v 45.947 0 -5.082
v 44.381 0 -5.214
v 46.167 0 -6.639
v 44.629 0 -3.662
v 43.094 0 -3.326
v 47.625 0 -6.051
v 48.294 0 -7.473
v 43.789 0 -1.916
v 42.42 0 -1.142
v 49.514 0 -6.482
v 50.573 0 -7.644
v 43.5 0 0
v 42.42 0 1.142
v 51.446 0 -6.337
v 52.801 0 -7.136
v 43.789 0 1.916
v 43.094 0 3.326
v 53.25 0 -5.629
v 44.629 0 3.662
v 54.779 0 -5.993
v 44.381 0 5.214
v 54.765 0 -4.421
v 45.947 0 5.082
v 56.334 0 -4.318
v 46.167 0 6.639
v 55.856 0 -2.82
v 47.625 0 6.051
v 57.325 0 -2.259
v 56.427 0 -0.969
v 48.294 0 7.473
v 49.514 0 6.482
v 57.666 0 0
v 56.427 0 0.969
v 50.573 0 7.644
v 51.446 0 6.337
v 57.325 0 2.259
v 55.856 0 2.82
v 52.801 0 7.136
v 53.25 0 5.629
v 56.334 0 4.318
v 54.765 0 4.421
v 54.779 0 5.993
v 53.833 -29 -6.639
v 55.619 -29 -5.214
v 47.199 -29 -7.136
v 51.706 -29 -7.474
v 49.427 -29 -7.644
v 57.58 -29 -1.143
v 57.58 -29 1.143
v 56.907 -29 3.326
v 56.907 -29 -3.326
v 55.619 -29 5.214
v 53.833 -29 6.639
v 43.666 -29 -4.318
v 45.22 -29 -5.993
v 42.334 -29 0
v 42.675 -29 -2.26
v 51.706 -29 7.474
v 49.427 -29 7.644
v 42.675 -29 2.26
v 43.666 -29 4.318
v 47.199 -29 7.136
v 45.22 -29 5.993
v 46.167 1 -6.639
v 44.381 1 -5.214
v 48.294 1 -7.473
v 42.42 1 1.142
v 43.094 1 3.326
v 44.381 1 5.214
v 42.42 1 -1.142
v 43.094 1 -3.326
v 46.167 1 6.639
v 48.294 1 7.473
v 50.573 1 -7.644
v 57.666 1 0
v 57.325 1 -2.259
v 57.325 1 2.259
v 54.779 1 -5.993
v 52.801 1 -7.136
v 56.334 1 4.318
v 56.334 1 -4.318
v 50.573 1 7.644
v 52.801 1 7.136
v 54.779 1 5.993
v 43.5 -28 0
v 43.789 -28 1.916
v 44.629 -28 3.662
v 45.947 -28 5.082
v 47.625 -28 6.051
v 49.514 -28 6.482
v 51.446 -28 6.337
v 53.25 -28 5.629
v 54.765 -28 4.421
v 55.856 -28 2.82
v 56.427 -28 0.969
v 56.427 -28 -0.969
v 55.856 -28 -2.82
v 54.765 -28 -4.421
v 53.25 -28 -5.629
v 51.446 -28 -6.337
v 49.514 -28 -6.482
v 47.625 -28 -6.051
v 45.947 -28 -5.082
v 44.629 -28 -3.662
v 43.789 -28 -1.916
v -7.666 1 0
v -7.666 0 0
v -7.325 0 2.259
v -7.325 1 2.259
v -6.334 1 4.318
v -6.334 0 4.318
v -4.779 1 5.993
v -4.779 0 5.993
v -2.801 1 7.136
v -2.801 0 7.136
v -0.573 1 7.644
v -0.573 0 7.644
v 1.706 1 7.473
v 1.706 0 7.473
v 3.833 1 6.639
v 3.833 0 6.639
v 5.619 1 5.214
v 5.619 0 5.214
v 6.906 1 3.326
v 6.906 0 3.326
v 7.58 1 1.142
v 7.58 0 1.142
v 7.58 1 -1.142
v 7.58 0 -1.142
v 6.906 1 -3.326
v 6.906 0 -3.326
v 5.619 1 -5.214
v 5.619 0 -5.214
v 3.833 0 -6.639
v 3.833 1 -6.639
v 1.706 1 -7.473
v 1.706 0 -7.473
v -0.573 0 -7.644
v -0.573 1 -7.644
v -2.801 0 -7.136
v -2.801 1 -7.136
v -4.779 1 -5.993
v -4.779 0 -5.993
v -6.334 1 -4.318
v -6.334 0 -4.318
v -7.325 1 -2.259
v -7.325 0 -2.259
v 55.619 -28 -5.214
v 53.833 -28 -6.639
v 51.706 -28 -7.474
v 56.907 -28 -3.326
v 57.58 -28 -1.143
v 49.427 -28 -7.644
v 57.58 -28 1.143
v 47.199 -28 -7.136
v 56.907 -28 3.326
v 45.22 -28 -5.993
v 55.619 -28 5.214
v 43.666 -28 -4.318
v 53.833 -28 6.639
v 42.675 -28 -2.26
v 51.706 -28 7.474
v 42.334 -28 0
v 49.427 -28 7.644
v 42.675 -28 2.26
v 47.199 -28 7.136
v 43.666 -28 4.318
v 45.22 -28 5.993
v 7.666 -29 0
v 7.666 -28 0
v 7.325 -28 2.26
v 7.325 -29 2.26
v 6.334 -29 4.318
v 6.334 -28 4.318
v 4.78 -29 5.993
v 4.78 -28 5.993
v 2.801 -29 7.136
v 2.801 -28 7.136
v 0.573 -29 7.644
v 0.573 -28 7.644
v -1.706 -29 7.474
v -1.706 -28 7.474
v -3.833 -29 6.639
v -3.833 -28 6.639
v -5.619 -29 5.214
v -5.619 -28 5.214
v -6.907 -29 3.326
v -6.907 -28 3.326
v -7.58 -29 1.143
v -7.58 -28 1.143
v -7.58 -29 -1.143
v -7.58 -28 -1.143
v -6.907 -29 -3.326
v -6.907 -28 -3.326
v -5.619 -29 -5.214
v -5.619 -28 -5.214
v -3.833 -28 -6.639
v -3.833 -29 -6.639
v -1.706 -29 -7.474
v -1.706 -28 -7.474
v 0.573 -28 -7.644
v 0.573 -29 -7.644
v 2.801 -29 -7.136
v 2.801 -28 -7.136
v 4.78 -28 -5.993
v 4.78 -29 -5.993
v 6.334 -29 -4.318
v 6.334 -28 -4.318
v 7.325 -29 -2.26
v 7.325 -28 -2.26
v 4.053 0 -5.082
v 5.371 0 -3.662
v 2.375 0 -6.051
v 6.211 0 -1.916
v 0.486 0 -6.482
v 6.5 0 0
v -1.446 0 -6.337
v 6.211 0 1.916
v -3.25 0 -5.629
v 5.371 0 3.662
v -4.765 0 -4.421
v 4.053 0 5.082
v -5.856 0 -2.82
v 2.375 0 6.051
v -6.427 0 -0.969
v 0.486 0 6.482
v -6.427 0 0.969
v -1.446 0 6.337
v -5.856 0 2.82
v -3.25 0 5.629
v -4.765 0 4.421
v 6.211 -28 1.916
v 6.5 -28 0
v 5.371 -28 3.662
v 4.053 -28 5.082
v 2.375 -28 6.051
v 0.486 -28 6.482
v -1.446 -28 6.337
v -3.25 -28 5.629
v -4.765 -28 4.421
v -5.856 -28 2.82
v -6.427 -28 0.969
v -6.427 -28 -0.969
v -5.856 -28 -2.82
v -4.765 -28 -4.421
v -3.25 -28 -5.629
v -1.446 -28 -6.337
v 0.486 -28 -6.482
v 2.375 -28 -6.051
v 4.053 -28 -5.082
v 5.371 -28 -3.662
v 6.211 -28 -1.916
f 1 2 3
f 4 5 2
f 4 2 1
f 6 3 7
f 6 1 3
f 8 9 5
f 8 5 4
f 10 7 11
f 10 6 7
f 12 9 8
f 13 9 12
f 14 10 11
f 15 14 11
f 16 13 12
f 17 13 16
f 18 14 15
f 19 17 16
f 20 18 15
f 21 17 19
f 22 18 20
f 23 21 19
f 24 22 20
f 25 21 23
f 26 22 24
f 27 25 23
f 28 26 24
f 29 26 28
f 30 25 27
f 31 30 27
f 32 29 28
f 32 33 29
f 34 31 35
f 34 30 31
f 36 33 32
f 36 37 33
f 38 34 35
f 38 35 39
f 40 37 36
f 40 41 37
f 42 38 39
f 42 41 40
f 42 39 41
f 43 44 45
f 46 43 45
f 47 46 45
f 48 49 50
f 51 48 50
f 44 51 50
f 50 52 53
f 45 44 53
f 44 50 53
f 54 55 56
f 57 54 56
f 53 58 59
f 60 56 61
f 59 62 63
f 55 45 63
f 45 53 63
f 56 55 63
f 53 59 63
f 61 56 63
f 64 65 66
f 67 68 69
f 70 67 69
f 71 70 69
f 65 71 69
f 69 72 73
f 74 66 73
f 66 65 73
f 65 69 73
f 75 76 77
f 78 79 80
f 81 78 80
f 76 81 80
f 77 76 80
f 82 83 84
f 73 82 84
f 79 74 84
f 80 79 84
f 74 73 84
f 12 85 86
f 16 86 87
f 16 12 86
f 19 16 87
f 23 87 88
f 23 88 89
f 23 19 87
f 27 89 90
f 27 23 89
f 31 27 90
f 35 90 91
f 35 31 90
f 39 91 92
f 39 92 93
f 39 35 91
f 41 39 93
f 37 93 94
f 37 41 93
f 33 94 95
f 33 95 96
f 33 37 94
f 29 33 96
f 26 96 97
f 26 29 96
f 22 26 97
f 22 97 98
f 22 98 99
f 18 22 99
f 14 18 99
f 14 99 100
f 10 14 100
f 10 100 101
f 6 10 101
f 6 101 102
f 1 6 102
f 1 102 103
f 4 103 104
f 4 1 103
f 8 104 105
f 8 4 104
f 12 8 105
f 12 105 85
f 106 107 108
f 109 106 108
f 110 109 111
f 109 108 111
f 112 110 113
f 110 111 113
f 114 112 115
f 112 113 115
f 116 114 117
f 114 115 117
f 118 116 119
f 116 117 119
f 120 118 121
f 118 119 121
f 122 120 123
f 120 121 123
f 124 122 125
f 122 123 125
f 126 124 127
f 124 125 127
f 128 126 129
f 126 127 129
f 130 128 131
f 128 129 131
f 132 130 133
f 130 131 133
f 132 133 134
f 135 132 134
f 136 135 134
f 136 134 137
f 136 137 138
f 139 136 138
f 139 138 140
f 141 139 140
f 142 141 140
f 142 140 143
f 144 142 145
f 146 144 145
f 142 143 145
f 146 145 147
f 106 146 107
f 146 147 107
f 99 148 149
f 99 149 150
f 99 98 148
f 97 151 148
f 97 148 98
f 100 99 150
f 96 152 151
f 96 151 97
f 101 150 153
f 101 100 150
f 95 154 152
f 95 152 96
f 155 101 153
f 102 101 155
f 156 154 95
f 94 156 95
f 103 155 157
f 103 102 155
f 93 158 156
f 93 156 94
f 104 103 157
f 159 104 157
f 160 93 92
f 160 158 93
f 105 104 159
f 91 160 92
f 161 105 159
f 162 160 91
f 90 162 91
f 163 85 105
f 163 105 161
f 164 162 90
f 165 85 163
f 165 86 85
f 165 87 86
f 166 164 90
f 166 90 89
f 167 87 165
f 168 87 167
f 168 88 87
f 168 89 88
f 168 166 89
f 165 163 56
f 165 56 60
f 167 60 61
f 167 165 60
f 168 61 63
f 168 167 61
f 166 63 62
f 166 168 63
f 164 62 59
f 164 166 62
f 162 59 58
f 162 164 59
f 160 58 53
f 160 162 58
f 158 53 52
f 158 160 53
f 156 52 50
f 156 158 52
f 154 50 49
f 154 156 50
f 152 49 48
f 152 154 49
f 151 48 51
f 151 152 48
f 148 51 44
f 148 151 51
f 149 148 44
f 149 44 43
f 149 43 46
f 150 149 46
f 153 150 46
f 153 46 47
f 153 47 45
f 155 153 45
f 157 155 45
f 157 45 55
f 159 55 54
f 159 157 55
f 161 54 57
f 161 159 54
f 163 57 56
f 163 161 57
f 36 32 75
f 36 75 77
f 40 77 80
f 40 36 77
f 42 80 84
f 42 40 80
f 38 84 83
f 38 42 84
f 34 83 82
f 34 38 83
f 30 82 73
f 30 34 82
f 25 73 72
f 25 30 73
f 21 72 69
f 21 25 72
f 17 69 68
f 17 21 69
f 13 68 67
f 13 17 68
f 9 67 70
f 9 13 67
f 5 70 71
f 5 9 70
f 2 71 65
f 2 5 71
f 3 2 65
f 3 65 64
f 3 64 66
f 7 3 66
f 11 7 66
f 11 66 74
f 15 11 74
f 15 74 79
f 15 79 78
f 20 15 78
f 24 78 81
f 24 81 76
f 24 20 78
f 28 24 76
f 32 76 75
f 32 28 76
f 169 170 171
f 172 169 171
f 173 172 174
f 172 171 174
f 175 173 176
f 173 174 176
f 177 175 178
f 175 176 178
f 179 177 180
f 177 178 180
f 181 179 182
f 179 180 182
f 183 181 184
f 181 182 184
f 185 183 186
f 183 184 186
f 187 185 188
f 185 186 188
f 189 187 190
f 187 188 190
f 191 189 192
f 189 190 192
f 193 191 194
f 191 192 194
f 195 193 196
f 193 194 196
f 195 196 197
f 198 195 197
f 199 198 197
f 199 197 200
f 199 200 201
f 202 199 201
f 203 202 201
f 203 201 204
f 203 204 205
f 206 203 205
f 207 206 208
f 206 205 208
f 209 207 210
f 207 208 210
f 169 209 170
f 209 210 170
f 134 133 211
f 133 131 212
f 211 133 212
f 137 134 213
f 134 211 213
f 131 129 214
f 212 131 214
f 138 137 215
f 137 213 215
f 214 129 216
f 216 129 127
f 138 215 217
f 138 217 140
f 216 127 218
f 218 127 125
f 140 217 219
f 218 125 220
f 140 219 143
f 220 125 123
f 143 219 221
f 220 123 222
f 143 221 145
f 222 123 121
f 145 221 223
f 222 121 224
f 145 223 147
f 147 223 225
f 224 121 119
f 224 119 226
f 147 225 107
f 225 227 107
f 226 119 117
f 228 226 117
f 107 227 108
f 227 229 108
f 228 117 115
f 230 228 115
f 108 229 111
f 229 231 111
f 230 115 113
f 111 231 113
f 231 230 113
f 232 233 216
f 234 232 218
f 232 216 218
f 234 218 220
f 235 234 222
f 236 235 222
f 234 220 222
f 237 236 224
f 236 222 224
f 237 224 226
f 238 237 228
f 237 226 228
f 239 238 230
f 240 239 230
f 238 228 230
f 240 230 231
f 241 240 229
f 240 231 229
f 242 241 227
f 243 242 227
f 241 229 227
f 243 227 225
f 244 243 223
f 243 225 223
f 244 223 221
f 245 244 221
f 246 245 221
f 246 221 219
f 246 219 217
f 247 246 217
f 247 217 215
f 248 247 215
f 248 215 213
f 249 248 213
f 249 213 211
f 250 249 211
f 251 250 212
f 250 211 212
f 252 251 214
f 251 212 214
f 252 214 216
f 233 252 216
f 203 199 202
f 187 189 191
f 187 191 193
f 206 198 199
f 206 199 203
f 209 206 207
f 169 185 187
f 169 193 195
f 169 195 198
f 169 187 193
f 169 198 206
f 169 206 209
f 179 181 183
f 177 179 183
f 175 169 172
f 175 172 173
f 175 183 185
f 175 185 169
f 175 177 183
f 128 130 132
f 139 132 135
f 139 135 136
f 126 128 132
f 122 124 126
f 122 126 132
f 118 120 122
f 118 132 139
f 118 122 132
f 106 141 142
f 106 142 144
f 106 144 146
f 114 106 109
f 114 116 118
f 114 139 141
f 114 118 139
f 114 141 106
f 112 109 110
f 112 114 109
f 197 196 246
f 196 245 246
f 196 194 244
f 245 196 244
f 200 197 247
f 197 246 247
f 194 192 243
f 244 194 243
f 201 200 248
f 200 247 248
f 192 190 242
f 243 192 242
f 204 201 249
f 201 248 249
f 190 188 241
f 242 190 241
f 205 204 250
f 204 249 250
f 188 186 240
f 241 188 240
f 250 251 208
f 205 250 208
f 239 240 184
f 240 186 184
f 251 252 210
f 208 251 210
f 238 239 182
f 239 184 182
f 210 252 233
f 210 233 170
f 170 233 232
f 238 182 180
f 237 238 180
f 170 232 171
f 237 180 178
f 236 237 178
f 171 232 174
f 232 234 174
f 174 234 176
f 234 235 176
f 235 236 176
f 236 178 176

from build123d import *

# Parameters (mm, degrees)
F0_R     = 6.5
F1_DEPTH = 28
F2_R     = 7.665742
F4_DEPTH = 1
F3_R     = 7.6655
F5_DEPTH = 1


with BuildPart() as f1:
    # F0 (on Front) → F1 (new body)
    with BuildSketch(Plane.XZ):
        Circle(F0_R)
    extrude(amount=F1_DEPTH)

    # F2 (on face) → F4 (join)
    with BuildSketch(Plane.XZ.offset(28)):
        Circle(F2_R)
    extrude(amount=F4_DEPTH)

    # F3 (on face) → F5 (join)
    with BuildSketch(Plane(origin=(0, 0, 0), x_dir=(-1, 0, 0), z_dir=(0, 1, 0))):
        Circle(F3_R)
    extrude(amount=F5_DEPTH)


with BuildPart() as f7_1:
    # F7: instance of F1
    add(f1.part.mirror(Plane.YZ.offset(25)))


solid = Compound([f1.part, f7_1.part])
